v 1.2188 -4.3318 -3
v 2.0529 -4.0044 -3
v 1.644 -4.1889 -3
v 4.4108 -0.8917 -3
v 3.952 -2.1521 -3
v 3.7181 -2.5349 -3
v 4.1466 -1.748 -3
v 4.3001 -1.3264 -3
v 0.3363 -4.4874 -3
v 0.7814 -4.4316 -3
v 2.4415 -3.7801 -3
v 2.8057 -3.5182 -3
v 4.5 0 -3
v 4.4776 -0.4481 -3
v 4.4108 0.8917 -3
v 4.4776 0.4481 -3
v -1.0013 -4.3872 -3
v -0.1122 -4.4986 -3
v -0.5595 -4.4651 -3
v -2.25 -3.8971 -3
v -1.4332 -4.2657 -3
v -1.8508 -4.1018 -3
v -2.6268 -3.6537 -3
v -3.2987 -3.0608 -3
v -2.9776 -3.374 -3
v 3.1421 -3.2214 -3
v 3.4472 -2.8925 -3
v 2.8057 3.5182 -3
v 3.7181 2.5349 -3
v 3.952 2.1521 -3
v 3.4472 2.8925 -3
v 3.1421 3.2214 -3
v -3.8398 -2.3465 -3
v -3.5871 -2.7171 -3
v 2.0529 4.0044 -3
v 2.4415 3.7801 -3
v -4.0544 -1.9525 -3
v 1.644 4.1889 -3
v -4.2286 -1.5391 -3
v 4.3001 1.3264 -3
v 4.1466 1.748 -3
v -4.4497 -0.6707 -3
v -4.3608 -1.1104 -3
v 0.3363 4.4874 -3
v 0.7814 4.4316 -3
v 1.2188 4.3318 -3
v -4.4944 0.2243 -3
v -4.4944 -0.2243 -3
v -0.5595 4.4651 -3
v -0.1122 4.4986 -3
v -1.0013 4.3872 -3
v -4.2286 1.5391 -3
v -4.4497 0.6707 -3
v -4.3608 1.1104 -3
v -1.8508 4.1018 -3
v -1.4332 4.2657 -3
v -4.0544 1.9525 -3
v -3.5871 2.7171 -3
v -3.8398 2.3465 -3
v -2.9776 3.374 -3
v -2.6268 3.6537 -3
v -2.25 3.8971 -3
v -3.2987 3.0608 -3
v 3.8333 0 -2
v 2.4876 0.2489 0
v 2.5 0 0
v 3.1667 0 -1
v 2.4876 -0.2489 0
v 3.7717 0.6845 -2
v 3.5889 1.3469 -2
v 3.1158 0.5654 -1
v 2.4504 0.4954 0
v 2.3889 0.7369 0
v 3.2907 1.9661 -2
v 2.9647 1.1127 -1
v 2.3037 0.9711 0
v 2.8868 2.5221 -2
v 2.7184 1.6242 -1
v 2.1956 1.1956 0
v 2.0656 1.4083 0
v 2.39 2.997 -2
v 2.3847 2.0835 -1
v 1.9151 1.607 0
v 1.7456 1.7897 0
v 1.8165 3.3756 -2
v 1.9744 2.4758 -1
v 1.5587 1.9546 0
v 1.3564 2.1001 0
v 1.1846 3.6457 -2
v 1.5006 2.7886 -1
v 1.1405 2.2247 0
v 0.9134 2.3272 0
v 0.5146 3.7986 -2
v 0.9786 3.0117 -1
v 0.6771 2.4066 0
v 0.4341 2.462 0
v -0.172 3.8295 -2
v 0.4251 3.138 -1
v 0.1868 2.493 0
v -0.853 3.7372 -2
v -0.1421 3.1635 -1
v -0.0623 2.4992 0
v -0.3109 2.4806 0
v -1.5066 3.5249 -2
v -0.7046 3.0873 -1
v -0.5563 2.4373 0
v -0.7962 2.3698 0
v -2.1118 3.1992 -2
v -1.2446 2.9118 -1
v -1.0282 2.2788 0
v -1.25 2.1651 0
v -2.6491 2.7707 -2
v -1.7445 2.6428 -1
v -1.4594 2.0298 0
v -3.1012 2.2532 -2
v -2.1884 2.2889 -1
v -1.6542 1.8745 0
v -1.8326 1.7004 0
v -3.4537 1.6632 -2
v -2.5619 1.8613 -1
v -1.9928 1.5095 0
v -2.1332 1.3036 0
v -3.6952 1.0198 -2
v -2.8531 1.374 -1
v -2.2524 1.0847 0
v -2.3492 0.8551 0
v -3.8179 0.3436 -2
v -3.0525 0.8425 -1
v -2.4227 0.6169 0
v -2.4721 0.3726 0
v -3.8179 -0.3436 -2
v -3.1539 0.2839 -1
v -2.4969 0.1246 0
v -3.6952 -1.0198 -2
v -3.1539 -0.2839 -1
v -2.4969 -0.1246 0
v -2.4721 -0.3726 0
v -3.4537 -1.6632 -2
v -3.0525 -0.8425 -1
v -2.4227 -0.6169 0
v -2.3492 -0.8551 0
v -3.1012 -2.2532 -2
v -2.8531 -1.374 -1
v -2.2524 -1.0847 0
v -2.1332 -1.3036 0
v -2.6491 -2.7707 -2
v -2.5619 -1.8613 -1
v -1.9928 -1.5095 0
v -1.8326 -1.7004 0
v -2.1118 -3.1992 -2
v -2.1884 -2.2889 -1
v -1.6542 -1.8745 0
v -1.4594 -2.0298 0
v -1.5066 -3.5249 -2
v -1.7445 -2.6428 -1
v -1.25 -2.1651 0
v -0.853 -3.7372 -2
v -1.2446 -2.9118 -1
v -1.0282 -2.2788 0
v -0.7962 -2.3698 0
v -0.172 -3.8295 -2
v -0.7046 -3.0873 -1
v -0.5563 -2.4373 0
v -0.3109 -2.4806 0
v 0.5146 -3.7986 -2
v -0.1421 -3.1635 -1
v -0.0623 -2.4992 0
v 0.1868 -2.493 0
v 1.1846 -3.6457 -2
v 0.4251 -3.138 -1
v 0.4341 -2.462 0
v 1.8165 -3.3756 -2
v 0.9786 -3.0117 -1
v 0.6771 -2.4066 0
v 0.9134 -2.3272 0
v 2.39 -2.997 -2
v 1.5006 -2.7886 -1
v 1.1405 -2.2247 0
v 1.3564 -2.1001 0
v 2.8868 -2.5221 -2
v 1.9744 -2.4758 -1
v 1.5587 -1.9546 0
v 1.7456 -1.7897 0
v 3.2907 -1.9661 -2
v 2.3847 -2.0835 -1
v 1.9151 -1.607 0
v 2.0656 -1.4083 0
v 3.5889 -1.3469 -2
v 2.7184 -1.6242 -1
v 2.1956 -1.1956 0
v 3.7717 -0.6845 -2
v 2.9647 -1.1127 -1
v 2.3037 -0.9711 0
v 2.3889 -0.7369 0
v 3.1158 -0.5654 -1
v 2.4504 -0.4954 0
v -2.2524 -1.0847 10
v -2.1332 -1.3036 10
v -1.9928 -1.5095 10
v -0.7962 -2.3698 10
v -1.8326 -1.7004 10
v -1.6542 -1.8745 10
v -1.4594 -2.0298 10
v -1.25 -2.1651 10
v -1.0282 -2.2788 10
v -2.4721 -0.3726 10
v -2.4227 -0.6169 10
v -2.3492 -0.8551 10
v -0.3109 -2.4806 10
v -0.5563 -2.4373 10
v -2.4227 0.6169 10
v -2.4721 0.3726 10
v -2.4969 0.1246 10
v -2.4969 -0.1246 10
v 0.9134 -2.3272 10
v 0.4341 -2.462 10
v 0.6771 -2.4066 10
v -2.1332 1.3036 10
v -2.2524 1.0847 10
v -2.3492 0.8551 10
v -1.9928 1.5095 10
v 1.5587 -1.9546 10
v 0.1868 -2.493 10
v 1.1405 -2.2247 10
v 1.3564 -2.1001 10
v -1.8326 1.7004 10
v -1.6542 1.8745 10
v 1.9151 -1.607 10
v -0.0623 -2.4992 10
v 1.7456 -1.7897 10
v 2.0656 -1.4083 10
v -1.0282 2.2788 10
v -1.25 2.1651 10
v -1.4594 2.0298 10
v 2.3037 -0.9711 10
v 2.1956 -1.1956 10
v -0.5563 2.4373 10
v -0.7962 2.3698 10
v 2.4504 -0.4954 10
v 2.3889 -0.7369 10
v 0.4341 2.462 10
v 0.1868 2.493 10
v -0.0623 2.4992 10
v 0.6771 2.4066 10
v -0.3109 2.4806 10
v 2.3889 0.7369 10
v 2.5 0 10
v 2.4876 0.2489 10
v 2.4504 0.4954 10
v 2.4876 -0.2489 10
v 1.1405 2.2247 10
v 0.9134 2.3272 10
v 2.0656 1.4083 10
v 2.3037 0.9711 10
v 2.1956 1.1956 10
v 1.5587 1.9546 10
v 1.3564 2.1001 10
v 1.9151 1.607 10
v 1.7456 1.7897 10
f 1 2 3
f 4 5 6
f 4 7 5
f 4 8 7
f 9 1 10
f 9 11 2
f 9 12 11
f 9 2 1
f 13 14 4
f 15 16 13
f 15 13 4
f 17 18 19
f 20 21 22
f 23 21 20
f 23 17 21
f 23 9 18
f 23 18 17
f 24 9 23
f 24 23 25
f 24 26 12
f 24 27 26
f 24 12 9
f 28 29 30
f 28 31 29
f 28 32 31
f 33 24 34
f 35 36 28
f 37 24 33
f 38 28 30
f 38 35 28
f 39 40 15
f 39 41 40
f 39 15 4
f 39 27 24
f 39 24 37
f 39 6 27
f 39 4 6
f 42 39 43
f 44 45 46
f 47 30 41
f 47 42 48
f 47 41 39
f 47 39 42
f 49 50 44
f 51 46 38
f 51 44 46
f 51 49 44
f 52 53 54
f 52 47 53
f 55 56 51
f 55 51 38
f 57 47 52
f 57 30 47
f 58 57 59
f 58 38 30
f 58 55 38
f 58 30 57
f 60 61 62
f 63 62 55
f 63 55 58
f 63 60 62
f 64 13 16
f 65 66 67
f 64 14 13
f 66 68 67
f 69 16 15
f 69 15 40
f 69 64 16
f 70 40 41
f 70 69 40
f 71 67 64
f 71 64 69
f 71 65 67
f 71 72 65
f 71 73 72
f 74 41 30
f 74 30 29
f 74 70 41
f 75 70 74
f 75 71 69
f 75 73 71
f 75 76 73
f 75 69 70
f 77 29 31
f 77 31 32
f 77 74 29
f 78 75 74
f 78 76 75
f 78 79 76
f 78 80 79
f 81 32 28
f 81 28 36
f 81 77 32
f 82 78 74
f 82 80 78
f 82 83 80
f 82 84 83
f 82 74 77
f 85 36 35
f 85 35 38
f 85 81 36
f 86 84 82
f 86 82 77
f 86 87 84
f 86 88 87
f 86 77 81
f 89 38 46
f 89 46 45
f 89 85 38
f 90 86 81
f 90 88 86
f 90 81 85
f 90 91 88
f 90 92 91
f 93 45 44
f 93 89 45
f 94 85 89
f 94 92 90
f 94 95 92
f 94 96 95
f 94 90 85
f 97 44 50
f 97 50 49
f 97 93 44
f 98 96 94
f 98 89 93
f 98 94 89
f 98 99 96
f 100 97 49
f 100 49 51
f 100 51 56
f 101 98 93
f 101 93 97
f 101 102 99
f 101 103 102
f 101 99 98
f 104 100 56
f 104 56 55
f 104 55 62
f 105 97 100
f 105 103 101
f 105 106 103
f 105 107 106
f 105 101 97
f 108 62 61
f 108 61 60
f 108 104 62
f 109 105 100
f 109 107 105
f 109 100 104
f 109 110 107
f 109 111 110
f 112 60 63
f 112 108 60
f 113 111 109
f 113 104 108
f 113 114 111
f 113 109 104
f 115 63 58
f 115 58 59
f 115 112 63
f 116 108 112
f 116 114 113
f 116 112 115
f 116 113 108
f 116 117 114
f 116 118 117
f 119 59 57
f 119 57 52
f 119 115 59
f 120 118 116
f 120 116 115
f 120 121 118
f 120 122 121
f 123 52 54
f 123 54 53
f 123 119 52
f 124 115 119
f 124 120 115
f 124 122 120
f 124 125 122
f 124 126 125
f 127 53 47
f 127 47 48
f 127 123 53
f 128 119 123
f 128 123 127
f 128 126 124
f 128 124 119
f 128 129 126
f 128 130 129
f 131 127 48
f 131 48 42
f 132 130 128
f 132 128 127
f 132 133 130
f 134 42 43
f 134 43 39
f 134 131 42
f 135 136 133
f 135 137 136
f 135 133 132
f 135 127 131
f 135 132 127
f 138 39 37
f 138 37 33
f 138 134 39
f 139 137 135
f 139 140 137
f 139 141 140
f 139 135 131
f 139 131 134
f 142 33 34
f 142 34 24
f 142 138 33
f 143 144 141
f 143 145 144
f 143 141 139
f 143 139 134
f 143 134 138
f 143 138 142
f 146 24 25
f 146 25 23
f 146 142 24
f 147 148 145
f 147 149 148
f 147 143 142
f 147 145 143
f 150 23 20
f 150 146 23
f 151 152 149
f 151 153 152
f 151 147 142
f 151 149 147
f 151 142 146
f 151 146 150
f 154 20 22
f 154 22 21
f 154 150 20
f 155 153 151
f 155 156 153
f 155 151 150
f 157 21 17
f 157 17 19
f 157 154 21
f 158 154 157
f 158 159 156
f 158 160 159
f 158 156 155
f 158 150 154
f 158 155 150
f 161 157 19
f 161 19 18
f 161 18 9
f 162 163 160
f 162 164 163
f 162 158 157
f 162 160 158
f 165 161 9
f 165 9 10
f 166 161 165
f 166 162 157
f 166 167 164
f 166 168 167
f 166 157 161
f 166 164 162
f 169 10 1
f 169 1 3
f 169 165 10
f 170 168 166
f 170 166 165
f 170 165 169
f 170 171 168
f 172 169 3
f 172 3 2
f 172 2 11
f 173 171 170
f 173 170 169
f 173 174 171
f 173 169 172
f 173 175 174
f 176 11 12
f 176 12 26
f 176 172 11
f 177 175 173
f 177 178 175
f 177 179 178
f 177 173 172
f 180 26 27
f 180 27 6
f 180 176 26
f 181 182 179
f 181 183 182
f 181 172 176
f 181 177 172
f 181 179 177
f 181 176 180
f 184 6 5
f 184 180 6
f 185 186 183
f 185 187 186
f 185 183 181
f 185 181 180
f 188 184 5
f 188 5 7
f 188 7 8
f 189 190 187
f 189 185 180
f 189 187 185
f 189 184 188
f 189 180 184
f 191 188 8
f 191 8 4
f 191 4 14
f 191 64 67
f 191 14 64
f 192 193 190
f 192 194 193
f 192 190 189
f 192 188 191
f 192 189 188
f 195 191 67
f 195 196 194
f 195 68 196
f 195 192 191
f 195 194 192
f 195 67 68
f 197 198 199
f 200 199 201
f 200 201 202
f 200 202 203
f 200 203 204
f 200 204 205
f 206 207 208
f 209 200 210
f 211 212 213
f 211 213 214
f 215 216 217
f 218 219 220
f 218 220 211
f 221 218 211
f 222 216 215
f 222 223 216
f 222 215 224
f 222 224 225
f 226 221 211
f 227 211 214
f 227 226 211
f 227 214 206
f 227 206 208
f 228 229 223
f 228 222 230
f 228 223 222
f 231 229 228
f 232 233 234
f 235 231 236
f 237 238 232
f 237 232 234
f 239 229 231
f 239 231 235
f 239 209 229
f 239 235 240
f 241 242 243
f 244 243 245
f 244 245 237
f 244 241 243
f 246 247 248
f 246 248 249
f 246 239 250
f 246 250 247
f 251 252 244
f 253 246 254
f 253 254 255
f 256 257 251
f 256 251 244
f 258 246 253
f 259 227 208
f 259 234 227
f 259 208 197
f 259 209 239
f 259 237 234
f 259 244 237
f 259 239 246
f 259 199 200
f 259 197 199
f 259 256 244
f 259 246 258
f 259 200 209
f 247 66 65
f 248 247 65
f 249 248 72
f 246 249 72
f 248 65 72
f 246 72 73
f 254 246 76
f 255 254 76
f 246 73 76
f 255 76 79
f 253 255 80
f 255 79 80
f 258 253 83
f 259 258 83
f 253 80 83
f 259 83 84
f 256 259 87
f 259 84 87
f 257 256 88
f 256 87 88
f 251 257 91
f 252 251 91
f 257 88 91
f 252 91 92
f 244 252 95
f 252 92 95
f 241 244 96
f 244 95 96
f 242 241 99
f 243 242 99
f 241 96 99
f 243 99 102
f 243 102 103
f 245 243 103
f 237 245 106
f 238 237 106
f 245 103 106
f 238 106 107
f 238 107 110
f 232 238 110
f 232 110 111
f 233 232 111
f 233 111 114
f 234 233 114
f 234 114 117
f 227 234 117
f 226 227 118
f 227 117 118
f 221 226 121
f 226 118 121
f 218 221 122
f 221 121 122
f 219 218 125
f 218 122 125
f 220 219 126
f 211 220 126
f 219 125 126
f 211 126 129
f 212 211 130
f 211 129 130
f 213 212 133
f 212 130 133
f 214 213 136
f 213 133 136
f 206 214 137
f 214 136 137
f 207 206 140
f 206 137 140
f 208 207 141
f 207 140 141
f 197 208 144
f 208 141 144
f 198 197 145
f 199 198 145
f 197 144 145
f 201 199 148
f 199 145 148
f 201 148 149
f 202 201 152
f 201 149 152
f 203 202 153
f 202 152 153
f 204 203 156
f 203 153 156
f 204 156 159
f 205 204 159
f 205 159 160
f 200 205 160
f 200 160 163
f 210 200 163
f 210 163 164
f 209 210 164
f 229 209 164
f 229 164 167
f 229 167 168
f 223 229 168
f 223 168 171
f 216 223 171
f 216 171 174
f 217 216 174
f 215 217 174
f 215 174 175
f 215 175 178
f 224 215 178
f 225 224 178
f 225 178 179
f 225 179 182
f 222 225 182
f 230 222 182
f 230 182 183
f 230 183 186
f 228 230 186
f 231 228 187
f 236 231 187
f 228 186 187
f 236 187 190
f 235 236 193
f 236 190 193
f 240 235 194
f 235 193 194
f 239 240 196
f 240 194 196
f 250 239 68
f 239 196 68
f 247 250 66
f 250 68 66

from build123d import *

# Parameters (mm, degrees)
CYLINDER001_R     = 2.5
CYLINDER001_DEPTH = 10


with BuildPart() as cone001:
    # Cone001 → Cone001 (revolve)
    with BuildSketch(Plane(origin=(0, 0, -3), x_dir=(1, 0, 0), z_dir=(0, -1, 0))):
        Polygon((0, 0), (4.5, 0), (2.5, 3), (0, 3), align=None)
    revolve(axis=Axis((0, 0, -3), (0, 0, 1)))


with BuildPart() as m5x10_senkkopf:
    # Cylinder001 → Cylinder001 (new body)
    with BuildSketch(Plane.XY):
        Circle(CYLINDER001_R)
    extrude(amount=CYLINDER001_DEPTH)

    # Fusion001: union Cone001
    add(cone001.part)


solid = m5x10_senkkopf.part
